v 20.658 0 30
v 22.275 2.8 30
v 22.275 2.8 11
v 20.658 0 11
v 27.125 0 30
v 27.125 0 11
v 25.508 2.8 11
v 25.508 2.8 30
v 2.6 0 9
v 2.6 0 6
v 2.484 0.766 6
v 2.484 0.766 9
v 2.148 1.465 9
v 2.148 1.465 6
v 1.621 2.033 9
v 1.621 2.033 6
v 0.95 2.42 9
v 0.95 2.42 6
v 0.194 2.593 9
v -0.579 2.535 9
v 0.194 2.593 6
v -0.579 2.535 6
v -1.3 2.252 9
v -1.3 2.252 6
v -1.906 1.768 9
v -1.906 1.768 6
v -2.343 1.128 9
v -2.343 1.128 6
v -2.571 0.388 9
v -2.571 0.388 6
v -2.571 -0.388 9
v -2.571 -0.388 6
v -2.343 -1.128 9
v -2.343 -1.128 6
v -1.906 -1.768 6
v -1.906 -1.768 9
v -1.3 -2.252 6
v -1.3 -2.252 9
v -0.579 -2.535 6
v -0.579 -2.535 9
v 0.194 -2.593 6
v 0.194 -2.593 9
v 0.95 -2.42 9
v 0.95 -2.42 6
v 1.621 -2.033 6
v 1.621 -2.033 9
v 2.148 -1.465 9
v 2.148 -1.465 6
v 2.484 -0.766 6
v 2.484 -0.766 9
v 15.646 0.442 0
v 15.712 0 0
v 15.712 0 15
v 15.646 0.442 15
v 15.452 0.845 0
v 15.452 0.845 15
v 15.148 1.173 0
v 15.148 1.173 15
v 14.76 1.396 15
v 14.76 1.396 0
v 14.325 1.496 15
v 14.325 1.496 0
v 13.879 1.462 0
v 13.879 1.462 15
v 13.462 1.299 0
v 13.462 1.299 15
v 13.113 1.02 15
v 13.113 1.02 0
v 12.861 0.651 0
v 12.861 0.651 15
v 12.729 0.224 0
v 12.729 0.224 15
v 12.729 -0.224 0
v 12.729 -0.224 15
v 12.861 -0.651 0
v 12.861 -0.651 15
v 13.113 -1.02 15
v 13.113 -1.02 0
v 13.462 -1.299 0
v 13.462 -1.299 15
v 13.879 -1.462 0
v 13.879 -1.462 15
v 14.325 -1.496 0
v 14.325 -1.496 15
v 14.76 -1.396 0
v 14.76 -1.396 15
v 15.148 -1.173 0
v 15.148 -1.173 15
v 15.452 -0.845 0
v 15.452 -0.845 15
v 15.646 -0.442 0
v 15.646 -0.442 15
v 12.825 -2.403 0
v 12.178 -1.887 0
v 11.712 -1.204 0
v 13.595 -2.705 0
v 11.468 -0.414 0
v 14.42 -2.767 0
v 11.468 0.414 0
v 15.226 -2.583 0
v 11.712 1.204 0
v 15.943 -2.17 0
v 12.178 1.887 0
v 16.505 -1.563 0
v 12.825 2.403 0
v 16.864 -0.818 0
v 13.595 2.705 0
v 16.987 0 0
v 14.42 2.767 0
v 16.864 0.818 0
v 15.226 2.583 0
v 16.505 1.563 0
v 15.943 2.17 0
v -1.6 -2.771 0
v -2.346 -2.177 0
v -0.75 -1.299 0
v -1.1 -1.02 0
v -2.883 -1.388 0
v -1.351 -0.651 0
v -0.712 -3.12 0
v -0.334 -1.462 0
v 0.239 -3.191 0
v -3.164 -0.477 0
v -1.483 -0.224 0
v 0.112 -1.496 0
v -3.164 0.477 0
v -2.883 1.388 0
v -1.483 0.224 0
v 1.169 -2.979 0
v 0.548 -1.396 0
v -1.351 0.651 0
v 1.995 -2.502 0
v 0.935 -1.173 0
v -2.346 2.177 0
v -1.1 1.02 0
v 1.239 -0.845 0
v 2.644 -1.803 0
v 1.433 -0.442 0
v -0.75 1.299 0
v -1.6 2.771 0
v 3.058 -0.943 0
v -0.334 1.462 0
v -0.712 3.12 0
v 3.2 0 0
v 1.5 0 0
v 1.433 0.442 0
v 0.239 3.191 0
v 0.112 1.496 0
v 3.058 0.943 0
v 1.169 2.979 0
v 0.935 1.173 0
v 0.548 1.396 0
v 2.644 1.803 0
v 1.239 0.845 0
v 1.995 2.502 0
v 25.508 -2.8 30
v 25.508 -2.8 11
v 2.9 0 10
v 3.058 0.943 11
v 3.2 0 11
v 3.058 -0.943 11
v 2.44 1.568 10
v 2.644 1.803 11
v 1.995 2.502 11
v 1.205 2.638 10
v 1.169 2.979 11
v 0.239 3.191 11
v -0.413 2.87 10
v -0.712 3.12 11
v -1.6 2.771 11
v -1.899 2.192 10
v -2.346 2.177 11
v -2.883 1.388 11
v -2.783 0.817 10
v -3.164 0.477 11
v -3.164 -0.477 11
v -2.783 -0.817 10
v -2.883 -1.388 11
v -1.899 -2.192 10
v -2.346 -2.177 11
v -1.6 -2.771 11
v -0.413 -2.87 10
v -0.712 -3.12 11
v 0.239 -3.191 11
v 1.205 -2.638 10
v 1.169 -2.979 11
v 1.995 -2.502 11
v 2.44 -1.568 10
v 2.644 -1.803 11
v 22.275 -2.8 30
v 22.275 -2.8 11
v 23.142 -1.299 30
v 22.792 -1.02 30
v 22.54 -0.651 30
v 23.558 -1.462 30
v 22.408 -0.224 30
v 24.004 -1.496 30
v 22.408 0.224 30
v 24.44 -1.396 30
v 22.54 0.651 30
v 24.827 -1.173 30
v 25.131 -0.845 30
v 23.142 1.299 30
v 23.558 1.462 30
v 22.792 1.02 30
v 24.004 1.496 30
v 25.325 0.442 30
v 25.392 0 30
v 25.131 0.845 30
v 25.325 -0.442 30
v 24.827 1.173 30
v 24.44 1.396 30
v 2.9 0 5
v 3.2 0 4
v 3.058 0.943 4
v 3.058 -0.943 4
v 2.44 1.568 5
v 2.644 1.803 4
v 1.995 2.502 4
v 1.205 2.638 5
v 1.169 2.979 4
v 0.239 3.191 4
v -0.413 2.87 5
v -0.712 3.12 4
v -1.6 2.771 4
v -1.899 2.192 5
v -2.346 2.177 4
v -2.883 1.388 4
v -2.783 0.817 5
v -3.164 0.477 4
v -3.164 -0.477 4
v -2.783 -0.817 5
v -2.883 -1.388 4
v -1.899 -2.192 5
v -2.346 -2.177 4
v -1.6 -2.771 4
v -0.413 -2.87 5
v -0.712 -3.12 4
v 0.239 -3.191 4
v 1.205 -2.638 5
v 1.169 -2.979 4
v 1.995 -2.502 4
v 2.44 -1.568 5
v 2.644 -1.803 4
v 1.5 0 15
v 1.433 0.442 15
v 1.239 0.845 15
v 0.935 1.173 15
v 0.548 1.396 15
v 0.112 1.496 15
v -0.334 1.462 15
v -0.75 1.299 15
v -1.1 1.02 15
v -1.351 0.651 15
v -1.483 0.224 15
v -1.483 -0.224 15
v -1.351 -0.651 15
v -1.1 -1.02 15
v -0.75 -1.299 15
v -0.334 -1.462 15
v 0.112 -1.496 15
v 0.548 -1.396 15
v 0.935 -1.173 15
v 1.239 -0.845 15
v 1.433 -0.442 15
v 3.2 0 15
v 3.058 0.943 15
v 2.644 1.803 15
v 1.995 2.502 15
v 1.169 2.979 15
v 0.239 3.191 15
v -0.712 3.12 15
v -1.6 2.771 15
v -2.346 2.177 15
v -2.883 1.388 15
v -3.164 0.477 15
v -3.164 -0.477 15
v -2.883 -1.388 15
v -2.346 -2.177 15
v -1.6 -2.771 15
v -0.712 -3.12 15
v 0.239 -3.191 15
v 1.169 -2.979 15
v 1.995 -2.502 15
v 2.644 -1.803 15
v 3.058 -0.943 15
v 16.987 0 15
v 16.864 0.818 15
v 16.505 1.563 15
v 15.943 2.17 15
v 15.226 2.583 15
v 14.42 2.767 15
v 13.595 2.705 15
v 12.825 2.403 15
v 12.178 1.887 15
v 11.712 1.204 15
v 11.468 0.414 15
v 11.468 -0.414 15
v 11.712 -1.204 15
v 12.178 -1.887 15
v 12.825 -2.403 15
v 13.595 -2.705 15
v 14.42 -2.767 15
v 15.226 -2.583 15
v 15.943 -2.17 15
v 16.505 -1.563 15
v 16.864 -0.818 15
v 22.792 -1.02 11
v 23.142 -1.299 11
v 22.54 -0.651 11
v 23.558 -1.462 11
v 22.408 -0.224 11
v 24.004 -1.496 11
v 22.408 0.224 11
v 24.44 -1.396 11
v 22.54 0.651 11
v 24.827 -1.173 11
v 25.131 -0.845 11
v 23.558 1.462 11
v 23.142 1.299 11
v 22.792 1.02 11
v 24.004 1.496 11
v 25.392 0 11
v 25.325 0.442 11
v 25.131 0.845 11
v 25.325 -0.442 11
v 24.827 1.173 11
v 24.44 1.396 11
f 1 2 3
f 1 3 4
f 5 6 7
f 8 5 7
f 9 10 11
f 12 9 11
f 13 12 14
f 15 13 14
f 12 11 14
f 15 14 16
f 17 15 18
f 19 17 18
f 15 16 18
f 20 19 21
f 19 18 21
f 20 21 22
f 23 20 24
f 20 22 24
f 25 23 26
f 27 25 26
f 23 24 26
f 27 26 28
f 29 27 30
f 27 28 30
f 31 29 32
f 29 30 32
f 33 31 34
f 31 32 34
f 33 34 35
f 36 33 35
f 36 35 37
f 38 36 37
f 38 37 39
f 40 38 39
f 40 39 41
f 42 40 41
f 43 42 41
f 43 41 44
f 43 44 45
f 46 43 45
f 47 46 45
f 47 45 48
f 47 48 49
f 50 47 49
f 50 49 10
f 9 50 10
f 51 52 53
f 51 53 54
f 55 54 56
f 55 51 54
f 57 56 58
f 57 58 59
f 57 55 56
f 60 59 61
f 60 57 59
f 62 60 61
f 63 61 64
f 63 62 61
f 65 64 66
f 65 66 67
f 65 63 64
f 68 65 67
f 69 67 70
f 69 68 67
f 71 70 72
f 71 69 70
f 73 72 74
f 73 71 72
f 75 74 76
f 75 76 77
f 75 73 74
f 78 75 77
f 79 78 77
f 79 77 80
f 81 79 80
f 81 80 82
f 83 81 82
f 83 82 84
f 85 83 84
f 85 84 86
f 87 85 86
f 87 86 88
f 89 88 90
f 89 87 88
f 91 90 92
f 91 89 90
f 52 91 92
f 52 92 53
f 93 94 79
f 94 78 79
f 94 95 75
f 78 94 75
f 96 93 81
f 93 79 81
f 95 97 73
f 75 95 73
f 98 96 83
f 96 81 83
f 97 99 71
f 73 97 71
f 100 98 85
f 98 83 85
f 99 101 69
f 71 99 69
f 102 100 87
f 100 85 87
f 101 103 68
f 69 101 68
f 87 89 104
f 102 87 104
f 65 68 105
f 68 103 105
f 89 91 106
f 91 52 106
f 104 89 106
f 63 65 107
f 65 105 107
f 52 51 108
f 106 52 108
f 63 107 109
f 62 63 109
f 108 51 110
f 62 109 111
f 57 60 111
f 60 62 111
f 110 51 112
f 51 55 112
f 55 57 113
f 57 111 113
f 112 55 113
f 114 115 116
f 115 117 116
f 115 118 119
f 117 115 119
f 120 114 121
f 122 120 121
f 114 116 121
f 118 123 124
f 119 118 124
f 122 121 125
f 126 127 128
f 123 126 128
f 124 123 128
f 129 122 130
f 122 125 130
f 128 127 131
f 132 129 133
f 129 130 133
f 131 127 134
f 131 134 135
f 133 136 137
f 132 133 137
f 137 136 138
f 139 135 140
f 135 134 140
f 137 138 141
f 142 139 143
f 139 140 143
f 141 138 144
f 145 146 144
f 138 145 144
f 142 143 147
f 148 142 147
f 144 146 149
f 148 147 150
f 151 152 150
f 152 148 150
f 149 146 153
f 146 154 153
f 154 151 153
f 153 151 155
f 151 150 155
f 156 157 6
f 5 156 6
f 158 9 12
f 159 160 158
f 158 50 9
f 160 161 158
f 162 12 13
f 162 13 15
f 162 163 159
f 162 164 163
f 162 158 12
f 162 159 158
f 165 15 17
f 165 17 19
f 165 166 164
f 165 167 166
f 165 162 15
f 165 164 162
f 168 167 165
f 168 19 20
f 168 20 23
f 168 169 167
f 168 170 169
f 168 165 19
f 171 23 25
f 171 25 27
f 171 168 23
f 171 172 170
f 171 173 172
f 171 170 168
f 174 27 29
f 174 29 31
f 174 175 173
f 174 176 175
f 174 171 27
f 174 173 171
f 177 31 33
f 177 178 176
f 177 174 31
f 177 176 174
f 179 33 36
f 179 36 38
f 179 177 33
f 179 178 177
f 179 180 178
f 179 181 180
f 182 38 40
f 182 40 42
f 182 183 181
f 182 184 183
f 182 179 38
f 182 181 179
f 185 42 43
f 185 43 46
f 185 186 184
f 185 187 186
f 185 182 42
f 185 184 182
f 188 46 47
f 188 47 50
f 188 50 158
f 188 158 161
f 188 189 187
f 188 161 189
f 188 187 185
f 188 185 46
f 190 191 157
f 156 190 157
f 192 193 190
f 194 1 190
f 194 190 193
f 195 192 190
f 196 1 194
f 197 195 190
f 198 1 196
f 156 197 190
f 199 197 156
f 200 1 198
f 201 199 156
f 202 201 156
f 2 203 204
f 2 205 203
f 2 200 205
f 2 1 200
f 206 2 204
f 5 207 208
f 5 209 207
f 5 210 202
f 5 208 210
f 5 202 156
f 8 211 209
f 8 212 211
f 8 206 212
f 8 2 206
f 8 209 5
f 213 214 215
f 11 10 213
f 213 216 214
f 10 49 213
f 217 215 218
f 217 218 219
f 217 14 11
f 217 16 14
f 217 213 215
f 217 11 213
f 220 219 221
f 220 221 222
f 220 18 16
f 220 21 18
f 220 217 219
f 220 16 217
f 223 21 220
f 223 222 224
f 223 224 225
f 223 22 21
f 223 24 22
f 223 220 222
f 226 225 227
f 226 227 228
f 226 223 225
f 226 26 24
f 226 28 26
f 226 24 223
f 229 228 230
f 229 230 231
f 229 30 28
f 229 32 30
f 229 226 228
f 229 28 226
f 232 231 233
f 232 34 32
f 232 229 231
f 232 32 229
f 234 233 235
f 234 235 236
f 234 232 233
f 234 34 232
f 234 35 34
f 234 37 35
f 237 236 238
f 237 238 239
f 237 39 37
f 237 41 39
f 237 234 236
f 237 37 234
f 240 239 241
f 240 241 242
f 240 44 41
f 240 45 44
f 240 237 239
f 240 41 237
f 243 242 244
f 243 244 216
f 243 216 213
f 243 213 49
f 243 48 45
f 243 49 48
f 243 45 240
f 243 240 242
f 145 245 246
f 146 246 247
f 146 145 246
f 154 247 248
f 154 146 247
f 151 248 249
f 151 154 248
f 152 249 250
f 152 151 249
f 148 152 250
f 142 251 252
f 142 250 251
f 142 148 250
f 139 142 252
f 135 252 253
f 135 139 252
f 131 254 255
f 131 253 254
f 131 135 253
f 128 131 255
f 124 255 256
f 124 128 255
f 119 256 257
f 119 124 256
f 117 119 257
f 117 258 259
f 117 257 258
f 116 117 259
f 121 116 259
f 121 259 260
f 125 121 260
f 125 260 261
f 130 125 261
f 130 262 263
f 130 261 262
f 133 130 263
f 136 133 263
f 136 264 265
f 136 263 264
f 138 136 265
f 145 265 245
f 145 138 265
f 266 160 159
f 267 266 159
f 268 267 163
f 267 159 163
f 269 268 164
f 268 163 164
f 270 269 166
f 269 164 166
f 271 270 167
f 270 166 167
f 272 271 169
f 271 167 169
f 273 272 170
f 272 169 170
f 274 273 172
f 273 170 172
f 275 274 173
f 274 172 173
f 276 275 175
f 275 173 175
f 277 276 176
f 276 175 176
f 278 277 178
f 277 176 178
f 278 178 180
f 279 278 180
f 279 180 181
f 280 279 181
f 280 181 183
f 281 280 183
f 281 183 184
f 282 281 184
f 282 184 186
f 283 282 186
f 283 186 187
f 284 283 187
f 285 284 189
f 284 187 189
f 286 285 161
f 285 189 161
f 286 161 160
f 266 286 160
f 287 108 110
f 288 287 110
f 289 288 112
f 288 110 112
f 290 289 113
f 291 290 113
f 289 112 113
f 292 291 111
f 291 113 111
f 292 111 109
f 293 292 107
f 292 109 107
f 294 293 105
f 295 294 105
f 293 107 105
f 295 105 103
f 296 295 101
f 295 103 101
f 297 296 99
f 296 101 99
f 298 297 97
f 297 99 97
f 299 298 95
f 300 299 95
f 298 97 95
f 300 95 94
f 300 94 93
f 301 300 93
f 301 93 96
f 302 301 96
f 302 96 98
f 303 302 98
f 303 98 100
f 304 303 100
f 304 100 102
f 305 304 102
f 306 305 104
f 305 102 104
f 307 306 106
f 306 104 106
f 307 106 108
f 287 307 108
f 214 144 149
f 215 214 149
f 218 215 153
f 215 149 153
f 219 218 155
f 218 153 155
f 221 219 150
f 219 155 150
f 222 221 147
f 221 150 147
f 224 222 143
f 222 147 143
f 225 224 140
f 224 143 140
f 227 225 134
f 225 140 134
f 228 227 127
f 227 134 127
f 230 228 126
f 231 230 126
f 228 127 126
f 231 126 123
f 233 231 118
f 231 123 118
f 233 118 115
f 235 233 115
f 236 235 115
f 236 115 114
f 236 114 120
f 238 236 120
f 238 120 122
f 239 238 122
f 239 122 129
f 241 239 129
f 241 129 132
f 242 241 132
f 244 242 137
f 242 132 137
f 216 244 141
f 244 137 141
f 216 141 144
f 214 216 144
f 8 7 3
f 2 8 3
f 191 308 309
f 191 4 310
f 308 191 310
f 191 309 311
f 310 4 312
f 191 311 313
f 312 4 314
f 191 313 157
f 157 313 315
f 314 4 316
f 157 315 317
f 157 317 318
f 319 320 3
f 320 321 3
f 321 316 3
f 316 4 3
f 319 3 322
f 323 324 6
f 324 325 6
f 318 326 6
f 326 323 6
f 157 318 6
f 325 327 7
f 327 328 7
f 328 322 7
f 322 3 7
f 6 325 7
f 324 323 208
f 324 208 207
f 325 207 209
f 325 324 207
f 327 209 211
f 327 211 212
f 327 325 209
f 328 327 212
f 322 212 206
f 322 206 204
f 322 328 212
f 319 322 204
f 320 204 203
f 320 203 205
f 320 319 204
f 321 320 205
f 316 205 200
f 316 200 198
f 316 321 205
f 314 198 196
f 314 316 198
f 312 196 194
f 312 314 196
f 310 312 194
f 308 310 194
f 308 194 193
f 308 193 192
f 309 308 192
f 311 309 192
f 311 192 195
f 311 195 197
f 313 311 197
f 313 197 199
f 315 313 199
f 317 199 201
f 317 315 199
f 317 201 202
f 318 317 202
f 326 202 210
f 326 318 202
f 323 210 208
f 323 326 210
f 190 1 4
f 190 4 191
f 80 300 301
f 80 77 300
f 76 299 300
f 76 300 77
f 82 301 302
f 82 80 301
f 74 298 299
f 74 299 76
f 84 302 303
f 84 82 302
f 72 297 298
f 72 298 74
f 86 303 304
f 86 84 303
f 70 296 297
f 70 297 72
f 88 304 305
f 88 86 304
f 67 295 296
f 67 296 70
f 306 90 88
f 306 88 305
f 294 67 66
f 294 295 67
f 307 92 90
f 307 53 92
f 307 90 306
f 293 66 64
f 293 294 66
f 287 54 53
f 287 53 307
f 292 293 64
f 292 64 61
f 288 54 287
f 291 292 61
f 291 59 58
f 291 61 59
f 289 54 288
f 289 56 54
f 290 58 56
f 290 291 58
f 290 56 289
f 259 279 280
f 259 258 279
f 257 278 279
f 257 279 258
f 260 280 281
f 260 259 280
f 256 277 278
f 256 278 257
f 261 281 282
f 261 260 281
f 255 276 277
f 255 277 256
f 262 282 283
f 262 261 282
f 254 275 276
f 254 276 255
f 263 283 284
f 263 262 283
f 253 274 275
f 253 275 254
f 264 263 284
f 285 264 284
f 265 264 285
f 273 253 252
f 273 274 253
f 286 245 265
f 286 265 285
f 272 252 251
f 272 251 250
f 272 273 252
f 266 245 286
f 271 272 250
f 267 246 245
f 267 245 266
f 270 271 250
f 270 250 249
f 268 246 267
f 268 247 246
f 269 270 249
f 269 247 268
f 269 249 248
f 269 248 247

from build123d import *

# Parameters (mm, degrees)
F0_R      = 3.2
F1_DEPTH  = 4
F1_FACE_R = 3.2
F3_R      = 2.6
F9_DEPTH  = 9
F6_R      = 2.6
F8_R      = 3.2
F11_DEPTH = 4
F12_R     = 1.5
F13_DEPTH = 25
F14_R     = 2.775
F14_R_2   = 1.5
F15_DEPTH = 15
F16_R     = 1.5
F17_DEPTH = 19


with BuildPart() as f1:
    # F0 (on Top) → F1 (new body)
    with BuildSketch(Plane.XY):
        Circle(F0_R)
    extrude(amount=F1_DEPTH)

    # F1_face (on face) → F4 section 0
    with BuildSketch(Plane.XY.offset(4)):
        Circle(F1_FACE_R)
    # F3 (on offset) → F4 section 1
    with BuildSketch(Plane.XY.offset(6)):
        Circle(F3_R)
    loft()

    # F3 (on offset) → F9 (join)
    with BuildSketch(Plane.XY.offset(6)):
        Circle(F3_R)
    extrude(amount=F9_DEPTH)

    # F6 (on offset) → F10 section 0
    with BuildSketch(Plane.XY.offset(9)):
        Circle(F6_R)
    # F8 (on offset) → F10 section 1
    with BuildSketch(Plane.XY.offset(11)):
        Circle(F8_R)
    loft()

    # F8 (on offset) → F11 (join)
    with BuildSketch(Plane.XY.offset(11)):
        Circle(F8_R)
    extrude(amount=F11_DEPTH)

    # F12 (on Top) → F13 (cut)
    with BuildSketch(Plane.XY):
        Circle(F12_R)
    extrude(amount=F13_DEPTH, mode=Mode.SUBTRACT)


with BuildPart() as f15:
    # F14 (on Top) → F15 (new body)
    with BuildSketch(Plane.XY):
        with Locations((14.212486, 0)):
            Circle(F14_R)
        with Locations((14.212486, 0)):
            Circle(F14_R_2, mode=Mode.SUBTRACT)
    extrude(amount=F15_DEPTH)


with BuildPart() as f17:
    # F16 (on offset) → F17 (new body)
    with BuildSketch(Plane.XY.offset(11)):
        Polygon((25.50818, 2.8), (22.275018, 2.8), (20.658438, 0), (22.275018, -2.8), (25.50818, -2.8), (27.124761, 0), align=None)
        with Locations((23.891599, 0)):
            Circle(F16_R, mode=Mode.SUBTRACT)
    extrude(amount=F17_DEPTH)


solid = Compound([f1.part, f15.part, f17.part])
